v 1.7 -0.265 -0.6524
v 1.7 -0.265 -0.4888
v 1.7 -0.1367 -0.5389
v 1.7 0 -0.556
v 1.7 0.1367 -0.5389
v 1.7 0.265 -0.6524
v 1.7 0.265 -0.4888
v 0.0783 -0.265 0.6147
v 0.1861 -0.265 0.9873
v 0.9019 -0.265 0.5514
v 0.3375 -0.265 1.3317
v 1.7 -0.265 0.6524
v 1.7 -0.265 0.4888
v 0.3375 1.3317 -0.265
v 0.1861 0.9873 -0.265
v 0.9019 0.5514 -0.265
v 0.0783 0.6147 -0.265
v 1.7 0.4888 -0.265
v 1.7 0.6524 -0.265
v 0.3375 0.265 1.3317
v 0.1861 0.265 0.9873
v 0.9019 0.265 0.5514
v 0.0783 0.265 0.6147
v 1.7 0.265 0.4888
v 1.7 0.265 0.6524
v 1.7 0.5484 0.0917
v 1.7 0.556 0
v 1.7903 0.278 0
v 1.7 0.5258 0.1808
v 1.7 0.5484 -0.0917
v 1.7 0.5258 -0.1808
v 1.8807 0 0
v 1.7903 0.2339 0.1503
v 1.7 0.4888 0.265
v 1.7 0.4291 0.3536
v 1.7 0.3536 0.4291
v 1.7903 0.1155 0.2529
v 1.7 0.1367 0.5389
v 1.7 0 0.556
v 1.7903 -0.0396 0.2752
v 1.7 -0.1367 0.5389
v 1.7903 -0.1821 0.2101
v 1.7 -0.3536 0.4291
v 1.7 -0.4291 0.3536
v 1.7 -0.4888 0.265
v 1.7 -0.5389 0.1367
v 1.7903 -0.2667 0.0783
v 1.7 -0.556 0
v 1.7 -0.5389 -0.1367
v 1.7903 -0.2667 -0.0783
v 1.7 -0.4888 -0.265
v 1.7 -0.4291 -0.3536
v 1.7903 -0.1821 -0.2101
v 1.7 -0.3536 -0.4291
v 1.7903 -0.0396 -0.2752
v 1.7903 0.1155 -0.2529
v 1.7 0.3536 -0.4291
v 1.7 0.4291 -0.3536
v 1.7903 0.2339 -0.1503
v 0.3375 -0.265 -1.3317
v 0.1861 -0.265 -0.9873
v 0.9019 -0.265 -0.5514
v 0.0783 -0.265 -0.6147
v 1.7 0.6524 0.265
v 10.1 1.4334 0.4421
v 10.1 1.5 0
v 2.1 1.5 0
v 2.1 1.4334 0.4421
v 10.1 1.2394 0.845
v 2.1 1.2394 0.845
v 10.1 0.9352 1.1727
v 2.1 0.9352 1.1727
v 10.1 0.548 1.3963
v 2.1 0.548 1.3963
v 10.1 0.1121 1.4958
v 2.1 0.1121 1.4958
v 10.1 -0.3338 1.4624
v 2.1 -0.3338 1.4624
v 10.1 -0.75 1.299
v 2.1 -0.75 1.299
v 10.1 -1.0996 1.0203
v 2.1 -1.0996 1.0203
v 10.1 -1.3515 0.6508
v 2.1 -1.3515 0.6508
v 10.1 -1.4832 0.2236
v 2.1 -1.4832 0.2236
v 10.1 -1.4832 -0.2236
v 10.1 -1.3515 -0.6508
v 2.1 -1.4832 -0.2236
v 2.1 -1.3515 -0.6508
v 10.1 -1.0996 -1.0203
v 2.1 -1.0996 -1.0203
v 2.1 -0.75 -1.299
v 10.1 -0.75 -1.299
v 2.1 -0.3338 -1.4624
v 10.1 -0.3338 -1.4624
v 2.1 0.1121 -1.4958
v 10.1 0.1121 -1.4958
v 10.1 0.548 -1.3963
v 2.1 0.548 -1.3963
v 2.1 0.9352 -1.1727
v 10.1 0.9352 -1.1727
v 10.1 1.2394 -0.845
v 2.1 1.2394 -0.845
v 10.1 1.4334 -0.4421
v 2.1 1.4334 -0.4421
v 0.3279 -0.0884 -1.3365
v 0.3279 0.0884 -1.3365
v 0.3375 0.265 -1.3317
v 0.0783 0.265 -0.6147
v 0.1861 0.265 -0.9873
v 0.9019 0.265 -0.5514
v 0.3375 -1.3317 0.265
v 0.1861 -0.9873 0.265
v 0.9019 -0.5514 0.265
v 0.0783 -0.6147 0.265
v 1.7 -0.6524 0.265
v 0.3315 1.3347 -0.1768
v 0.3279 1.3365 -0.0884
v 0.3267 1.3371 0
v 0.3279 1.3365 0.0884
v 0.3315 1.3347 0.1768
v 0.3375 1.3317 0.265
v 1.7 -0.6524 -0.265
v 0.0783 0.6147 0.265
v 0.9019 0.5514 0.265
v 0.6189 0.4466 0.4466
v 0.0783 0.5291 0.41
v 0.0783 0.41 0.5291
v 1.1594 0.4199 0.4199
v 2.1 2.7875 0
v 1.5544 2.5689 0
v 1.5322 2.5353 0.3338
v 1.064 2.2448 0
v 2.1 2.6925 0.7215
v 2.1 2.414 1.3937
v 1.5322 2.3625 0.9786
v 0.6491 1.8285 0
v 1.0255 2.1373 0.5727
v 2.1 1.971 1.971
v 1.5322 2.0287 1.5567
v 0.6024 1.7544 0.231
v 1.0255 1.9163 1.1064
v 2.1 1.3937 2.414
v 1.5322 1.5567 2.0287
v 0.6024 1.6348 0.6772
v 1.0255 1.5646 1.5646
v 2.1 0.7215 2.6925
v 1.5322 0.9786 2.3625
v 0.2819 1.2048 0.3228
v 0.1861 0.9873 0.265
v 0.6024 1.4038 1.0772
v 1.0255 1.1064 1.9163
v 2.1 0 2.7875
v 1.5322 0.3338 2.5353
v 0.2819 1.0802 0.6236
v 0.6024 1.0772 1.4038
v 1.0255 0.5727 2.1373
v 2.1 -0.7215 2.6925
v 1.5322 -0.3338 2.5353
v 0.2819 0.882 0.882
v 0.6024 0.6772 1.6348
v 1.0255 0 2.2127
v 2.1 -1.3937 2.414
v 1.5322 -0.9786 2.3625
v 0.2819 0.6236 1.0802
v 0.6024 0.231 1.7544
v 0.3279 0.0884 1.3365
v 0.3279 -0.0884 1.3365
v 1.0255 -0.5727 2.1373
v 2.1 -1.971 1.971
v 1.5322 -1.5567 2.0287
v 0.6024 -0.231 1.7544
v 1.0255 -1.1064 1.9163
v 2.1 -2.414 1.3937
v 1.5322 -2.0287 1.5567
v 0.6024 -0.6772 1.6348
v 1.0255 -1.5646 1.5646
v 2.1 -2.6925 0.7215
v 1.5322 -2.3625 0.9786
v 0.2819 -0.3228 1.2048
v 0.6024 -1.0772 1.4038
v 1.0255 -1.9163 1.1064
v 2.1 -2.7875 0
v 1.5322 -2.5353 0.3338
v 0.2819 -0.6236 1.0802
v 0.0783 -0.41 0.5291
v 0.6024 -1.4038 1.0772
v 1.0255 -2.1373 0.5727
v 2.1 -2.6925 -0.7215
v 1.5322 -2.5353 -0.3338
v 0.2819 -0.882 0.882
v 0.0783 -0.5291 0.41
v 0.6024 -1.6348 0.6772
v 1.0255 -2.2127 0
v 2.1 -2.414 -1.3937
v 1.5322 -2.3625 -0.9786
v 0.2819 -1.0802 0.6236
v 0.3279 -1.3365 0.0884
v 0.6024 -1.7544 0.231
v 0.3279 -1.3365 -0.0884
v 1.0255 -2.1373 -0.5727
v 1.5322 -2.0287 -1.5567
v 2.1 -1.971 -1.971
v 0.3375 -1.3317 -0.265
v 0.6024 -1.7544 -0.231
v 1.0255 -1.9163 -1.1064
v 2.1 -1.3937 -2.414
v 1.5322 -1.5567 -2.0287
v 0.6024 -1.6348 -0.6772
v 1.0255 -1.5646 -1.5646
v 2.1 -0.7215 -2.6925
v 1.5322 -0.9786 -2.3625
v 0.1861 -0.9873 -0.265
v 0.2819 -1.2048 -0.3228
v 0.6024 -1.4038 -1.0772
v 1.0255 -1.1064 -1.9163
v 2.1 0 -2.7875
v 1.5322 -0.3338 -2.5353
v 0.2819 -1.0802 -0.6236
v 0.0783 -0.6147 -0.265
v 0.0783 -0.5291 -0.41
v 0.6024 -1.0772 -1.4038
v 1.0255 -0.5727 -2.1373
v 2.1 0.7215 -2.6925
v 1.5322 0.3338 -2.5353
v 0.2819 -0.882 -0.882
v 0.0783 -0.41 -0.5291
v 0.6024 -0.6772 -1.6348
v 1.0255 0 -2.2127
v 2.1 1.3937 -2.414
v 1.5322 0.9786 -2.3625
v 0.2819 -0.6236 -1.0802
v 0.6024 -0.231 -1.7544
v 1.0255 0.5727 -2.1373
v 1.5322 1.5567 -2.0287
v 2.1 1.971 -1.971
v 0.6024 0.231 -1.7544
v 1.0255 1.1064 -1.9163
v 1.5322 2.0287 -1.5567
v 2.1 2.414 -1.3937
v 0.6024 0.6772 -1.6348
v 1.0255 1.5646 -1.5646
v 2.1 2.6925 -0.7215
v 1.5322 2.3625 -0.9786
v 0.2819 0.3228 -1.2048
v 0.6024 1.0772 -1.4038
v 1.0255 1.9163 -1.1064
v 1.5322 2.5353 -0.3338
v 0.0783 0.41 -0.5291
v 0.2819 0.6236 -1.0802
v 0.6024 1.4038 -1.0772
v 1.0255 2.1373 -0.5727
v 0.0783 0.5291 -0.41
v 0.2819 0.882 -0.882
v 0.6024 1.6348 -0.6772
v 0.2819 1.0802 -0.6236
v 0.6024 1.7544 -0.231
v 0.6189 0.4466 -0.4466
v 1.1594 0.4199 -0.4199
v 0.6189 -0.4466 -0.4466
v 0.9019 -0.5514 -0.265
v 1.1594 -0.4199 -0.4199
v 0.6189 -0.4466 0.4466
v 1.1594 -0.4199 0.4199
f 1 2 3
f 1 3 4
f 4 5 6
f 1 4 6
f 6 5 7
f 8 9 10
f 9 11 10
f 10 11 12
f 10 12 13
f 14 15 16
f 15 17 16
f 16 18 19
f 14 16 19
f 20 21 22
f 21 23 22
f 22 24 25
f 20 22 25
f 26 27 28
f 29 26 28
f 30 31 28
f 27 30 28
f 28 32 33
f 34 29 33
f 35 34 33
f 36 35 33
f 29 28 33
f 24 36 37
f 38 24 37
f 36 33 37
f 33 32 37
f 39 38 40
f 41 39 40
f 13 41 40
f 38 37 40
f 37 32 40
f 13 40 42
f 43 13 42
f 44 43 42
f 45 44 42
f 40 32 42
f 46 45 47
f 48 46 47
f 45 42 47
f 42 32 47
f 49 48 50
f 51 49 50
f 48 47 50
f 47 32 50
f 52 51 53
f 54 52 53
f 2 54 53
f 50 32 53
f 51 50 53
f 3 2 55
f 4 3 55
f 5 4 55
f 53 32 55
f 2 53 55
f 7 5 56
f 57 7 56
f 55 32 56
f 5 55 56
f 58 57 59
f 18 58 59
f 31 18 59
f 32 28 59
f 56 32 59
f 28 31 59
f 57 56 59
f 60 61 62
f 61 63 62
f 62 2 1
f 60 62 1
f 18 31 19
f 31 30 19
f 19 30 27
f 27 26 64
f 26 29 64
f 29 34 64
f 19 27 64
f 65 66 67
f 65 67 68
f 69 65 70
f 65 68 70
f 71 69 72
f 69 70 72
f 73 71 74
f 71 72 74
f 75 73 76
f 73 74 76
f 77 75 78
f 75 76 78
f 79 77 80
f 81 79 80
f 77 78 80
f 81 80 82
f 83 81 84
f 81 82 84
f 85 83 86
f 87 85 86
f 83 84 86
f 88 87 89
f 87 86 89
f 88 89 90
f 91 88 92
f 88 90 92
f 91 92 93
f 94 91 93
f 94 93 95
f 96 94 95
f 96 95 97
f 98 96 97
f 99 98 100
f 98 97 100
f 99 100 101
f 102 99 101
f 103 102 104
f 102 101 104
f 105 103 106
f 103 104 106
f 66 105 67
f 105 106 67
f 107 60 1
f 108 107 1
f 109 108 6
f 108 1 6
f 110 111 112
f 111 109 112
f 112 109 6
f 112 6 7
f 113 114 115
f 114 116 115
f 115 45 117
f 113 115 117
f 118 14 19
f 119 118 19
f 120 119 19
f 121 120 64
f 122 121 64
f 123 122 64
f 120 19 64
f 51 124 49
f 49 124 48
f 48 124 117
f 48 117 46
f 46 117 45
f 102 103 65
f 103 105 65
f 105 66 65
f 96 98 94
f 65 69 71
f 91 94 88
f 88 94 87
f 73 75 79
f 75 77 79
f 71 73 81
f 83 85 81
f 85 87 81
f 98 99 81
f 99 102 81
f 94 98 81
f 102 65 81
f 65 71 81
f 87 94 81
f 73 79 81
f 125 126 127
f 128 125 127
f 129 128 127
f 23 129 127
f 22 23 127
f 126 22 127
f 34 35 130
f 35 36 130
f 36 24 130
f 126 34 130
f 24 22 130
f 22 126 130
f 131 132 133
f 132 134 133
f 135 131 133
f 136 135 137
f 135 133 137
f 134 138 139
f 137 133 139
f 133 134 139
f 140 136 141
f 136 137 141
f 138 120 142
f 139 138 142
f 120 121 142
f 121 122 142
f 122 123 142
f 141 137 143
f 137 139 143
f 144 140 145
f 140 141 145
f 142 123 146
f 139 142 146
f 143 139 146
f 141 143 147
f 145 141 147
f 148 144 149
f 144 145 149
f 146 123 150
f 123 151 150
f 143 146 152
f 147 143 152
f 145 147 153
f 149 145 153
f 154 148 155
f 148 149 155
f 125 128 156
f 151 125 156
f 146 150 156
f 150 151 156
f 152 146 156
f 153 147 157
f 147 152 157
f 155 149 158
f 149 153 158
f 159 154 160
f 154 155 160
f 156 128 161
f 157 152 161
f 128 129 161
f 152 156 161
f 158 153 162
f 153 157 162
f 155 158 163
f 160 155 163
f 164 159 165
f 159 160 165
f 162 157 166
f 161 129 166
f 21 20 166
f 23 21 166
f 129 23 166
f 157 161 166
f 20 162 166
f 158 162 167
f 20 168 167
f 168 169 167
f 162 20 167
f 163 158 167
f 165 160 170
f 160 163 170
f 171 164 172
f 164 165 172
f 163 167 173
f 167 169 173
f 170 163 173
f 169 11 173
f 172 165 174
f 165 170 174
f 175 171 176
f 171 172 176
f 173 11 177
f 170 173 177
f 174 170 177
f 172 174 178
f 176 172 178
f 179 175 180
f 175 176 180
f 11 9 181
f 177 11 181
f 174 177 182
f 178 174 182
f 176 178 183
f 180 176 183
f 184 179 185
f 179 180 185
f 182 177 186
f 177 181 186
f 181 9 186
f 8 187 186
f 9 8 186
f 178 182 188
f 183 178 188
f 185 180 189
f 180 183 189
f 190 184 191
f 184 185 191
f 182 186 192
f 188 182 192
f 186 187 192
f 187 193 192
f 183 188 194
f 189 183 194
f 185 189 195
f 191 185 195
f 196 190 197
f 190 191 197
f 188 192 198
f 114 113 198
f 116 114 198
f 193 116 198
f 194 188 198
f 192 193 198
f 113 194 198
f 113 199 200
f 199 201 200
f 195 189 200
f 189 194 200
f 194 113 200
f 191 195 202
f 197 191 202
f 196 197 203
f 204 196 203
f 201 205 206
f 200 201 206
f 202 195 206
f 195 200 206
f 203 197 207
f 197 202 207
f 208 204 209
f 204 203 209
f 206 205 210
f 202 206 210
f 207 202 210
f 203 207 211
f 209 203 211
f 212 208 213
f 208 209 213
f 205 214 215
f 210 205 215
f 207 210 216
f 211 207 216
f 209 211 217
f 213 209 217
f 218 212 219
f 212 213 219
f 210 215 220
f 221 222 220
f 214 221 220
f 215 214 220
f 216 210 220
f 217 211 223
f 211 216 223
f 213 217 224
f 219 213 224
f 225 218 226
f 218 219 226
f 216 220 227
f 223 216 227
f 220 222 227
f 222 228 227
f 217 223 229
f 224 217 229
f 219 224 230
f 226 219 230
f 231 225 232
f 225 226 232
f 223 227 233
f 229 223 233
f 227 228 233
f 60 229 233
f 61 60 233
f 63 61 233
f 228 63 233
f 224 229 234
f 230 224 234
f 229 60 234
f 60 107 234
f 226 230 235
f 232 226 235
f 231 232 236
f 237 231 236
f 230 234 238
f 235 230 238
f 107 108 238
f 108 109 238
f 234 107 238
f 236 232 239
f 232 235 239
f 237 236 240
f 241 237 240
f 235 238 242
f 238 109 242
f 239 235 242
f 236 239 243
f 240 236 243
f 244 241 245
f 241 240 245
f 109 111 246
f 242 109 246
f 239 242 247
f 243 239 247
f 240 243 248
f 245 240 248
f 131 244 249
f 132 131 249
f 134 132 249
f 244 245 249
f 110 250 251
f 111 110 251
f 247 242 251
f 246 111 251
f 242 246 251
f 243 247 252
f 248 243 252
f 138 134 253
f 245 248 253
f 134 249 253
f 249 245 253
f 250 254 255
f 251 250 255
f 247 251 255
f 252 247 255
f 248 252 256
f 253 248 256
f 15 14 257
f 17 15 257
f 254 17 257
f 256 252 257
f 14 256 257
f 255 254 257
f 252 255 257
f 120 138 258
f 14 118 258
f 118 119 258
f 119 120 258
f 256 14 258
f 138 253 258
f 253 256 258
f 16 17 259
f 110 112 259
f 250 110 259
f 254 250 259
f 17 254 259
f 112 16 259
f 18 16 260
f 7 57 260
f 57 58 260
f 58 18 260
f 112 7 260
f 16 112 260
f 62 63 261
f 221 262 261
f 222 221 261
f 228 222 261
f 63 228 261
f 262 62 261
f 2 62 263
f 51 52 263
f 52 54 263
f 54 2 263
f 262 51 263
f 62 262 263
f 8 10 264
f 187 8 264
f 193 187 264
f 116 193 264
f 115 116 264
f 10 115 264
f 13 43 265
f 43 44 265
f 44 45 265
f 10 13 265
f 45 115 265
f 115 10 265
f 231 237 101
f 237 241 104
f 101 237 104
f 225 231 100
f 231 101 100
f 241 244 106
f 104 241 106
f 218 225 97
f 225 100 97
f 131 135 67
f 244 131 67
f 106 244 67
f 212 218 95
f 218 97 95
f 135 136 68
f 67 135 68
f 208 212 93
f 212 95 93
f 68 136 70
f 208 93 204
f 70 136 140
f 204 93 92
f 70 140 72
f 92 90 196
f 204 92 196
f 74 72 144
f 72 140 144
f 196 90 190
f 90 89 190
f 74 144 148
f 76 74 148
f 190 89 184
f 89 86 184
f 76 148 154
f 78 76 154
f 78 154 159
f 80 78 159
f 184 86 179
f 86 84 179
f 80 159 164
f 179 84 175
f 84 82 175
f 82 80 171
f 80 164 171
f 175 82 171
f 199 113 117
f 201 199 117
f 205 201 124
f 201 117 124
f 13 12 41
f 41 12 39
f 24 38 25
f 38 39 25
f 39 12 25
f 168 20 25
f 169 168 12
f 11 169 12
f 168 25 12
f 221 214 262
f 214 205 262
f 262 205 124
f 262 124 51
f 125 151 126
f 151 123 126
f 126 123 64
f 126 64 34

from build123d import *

# Parameters (mm, degrees)
SKETCH3_W    = 0.53
SKETCH3_H    = 3
SKETCH4_W    = 0.53
SKETCH4_H    = 1.304822816
RECPAT_COUNT = 2
RECPAT_ANGLE = 90


with BuildPart() as part:
    # BodySke → Base-Revolve (revolve)
    with BuildSketch(Plane.XY):
        with BuildLine():
            Line((2.1, 1.5), (2.1, 2.787471973))
            ThreePointArc((2.1, 2.787471973), (0.583753036, 1.744992837), (0, 0))
            Line((0, 0), (10.1, 0))
            Line((10.1, 0), (10.1, 1.5))
            Line((10.1, 1.5), (2.1, 1.5))
        make_face()
    revolve(axis=Axis((-25.4, 0, 0), (1, 0, 0)))

    # Sketch3 → Recess section 0
    with BuildSketch(Plane(origin=(0, 0, 0), x_dir=(0, 0, -1), z_dir=(1, 0, 0))):
        Rectangle(SKETCH3_W, SKETCH3_H)
    # Sketch4 → Recess section 1
    with BuildSketch(Plane(origin=(1.7, 0, 0), x_dir=(0, 0, -1), z_dir=(1, 0, 0))):
        Rectangle(SKETCH4_W, SKETCH4_H)
    recess = loft(mode=Mode.SUBTRACT)

    # RecPat: Recess ×2 about axis
    recpat_axis = Axis((0, 0, 0), (1, 0, 0))
    for i in range(1, RECPAT_COUNT):
        add(recess.rotate(recpat_axis, i * RECPAT_ANGLE / (RECPAT_COUNT - 1)), mode=Mode.SUBTRACT)

    # RecCorSke → RecessCore (revolve, cut)
    with BuildSketch(Plane.XY):
        Polygon((0, 0), (0, 0.67487558), (1.7, 0.556), (1.880655351, 0), align=None)
    revolve(axis=Axis((-3.175, 0, 0), (1, 0, 0)), mode=Mode.SUBTRACT)


solid = part.part
